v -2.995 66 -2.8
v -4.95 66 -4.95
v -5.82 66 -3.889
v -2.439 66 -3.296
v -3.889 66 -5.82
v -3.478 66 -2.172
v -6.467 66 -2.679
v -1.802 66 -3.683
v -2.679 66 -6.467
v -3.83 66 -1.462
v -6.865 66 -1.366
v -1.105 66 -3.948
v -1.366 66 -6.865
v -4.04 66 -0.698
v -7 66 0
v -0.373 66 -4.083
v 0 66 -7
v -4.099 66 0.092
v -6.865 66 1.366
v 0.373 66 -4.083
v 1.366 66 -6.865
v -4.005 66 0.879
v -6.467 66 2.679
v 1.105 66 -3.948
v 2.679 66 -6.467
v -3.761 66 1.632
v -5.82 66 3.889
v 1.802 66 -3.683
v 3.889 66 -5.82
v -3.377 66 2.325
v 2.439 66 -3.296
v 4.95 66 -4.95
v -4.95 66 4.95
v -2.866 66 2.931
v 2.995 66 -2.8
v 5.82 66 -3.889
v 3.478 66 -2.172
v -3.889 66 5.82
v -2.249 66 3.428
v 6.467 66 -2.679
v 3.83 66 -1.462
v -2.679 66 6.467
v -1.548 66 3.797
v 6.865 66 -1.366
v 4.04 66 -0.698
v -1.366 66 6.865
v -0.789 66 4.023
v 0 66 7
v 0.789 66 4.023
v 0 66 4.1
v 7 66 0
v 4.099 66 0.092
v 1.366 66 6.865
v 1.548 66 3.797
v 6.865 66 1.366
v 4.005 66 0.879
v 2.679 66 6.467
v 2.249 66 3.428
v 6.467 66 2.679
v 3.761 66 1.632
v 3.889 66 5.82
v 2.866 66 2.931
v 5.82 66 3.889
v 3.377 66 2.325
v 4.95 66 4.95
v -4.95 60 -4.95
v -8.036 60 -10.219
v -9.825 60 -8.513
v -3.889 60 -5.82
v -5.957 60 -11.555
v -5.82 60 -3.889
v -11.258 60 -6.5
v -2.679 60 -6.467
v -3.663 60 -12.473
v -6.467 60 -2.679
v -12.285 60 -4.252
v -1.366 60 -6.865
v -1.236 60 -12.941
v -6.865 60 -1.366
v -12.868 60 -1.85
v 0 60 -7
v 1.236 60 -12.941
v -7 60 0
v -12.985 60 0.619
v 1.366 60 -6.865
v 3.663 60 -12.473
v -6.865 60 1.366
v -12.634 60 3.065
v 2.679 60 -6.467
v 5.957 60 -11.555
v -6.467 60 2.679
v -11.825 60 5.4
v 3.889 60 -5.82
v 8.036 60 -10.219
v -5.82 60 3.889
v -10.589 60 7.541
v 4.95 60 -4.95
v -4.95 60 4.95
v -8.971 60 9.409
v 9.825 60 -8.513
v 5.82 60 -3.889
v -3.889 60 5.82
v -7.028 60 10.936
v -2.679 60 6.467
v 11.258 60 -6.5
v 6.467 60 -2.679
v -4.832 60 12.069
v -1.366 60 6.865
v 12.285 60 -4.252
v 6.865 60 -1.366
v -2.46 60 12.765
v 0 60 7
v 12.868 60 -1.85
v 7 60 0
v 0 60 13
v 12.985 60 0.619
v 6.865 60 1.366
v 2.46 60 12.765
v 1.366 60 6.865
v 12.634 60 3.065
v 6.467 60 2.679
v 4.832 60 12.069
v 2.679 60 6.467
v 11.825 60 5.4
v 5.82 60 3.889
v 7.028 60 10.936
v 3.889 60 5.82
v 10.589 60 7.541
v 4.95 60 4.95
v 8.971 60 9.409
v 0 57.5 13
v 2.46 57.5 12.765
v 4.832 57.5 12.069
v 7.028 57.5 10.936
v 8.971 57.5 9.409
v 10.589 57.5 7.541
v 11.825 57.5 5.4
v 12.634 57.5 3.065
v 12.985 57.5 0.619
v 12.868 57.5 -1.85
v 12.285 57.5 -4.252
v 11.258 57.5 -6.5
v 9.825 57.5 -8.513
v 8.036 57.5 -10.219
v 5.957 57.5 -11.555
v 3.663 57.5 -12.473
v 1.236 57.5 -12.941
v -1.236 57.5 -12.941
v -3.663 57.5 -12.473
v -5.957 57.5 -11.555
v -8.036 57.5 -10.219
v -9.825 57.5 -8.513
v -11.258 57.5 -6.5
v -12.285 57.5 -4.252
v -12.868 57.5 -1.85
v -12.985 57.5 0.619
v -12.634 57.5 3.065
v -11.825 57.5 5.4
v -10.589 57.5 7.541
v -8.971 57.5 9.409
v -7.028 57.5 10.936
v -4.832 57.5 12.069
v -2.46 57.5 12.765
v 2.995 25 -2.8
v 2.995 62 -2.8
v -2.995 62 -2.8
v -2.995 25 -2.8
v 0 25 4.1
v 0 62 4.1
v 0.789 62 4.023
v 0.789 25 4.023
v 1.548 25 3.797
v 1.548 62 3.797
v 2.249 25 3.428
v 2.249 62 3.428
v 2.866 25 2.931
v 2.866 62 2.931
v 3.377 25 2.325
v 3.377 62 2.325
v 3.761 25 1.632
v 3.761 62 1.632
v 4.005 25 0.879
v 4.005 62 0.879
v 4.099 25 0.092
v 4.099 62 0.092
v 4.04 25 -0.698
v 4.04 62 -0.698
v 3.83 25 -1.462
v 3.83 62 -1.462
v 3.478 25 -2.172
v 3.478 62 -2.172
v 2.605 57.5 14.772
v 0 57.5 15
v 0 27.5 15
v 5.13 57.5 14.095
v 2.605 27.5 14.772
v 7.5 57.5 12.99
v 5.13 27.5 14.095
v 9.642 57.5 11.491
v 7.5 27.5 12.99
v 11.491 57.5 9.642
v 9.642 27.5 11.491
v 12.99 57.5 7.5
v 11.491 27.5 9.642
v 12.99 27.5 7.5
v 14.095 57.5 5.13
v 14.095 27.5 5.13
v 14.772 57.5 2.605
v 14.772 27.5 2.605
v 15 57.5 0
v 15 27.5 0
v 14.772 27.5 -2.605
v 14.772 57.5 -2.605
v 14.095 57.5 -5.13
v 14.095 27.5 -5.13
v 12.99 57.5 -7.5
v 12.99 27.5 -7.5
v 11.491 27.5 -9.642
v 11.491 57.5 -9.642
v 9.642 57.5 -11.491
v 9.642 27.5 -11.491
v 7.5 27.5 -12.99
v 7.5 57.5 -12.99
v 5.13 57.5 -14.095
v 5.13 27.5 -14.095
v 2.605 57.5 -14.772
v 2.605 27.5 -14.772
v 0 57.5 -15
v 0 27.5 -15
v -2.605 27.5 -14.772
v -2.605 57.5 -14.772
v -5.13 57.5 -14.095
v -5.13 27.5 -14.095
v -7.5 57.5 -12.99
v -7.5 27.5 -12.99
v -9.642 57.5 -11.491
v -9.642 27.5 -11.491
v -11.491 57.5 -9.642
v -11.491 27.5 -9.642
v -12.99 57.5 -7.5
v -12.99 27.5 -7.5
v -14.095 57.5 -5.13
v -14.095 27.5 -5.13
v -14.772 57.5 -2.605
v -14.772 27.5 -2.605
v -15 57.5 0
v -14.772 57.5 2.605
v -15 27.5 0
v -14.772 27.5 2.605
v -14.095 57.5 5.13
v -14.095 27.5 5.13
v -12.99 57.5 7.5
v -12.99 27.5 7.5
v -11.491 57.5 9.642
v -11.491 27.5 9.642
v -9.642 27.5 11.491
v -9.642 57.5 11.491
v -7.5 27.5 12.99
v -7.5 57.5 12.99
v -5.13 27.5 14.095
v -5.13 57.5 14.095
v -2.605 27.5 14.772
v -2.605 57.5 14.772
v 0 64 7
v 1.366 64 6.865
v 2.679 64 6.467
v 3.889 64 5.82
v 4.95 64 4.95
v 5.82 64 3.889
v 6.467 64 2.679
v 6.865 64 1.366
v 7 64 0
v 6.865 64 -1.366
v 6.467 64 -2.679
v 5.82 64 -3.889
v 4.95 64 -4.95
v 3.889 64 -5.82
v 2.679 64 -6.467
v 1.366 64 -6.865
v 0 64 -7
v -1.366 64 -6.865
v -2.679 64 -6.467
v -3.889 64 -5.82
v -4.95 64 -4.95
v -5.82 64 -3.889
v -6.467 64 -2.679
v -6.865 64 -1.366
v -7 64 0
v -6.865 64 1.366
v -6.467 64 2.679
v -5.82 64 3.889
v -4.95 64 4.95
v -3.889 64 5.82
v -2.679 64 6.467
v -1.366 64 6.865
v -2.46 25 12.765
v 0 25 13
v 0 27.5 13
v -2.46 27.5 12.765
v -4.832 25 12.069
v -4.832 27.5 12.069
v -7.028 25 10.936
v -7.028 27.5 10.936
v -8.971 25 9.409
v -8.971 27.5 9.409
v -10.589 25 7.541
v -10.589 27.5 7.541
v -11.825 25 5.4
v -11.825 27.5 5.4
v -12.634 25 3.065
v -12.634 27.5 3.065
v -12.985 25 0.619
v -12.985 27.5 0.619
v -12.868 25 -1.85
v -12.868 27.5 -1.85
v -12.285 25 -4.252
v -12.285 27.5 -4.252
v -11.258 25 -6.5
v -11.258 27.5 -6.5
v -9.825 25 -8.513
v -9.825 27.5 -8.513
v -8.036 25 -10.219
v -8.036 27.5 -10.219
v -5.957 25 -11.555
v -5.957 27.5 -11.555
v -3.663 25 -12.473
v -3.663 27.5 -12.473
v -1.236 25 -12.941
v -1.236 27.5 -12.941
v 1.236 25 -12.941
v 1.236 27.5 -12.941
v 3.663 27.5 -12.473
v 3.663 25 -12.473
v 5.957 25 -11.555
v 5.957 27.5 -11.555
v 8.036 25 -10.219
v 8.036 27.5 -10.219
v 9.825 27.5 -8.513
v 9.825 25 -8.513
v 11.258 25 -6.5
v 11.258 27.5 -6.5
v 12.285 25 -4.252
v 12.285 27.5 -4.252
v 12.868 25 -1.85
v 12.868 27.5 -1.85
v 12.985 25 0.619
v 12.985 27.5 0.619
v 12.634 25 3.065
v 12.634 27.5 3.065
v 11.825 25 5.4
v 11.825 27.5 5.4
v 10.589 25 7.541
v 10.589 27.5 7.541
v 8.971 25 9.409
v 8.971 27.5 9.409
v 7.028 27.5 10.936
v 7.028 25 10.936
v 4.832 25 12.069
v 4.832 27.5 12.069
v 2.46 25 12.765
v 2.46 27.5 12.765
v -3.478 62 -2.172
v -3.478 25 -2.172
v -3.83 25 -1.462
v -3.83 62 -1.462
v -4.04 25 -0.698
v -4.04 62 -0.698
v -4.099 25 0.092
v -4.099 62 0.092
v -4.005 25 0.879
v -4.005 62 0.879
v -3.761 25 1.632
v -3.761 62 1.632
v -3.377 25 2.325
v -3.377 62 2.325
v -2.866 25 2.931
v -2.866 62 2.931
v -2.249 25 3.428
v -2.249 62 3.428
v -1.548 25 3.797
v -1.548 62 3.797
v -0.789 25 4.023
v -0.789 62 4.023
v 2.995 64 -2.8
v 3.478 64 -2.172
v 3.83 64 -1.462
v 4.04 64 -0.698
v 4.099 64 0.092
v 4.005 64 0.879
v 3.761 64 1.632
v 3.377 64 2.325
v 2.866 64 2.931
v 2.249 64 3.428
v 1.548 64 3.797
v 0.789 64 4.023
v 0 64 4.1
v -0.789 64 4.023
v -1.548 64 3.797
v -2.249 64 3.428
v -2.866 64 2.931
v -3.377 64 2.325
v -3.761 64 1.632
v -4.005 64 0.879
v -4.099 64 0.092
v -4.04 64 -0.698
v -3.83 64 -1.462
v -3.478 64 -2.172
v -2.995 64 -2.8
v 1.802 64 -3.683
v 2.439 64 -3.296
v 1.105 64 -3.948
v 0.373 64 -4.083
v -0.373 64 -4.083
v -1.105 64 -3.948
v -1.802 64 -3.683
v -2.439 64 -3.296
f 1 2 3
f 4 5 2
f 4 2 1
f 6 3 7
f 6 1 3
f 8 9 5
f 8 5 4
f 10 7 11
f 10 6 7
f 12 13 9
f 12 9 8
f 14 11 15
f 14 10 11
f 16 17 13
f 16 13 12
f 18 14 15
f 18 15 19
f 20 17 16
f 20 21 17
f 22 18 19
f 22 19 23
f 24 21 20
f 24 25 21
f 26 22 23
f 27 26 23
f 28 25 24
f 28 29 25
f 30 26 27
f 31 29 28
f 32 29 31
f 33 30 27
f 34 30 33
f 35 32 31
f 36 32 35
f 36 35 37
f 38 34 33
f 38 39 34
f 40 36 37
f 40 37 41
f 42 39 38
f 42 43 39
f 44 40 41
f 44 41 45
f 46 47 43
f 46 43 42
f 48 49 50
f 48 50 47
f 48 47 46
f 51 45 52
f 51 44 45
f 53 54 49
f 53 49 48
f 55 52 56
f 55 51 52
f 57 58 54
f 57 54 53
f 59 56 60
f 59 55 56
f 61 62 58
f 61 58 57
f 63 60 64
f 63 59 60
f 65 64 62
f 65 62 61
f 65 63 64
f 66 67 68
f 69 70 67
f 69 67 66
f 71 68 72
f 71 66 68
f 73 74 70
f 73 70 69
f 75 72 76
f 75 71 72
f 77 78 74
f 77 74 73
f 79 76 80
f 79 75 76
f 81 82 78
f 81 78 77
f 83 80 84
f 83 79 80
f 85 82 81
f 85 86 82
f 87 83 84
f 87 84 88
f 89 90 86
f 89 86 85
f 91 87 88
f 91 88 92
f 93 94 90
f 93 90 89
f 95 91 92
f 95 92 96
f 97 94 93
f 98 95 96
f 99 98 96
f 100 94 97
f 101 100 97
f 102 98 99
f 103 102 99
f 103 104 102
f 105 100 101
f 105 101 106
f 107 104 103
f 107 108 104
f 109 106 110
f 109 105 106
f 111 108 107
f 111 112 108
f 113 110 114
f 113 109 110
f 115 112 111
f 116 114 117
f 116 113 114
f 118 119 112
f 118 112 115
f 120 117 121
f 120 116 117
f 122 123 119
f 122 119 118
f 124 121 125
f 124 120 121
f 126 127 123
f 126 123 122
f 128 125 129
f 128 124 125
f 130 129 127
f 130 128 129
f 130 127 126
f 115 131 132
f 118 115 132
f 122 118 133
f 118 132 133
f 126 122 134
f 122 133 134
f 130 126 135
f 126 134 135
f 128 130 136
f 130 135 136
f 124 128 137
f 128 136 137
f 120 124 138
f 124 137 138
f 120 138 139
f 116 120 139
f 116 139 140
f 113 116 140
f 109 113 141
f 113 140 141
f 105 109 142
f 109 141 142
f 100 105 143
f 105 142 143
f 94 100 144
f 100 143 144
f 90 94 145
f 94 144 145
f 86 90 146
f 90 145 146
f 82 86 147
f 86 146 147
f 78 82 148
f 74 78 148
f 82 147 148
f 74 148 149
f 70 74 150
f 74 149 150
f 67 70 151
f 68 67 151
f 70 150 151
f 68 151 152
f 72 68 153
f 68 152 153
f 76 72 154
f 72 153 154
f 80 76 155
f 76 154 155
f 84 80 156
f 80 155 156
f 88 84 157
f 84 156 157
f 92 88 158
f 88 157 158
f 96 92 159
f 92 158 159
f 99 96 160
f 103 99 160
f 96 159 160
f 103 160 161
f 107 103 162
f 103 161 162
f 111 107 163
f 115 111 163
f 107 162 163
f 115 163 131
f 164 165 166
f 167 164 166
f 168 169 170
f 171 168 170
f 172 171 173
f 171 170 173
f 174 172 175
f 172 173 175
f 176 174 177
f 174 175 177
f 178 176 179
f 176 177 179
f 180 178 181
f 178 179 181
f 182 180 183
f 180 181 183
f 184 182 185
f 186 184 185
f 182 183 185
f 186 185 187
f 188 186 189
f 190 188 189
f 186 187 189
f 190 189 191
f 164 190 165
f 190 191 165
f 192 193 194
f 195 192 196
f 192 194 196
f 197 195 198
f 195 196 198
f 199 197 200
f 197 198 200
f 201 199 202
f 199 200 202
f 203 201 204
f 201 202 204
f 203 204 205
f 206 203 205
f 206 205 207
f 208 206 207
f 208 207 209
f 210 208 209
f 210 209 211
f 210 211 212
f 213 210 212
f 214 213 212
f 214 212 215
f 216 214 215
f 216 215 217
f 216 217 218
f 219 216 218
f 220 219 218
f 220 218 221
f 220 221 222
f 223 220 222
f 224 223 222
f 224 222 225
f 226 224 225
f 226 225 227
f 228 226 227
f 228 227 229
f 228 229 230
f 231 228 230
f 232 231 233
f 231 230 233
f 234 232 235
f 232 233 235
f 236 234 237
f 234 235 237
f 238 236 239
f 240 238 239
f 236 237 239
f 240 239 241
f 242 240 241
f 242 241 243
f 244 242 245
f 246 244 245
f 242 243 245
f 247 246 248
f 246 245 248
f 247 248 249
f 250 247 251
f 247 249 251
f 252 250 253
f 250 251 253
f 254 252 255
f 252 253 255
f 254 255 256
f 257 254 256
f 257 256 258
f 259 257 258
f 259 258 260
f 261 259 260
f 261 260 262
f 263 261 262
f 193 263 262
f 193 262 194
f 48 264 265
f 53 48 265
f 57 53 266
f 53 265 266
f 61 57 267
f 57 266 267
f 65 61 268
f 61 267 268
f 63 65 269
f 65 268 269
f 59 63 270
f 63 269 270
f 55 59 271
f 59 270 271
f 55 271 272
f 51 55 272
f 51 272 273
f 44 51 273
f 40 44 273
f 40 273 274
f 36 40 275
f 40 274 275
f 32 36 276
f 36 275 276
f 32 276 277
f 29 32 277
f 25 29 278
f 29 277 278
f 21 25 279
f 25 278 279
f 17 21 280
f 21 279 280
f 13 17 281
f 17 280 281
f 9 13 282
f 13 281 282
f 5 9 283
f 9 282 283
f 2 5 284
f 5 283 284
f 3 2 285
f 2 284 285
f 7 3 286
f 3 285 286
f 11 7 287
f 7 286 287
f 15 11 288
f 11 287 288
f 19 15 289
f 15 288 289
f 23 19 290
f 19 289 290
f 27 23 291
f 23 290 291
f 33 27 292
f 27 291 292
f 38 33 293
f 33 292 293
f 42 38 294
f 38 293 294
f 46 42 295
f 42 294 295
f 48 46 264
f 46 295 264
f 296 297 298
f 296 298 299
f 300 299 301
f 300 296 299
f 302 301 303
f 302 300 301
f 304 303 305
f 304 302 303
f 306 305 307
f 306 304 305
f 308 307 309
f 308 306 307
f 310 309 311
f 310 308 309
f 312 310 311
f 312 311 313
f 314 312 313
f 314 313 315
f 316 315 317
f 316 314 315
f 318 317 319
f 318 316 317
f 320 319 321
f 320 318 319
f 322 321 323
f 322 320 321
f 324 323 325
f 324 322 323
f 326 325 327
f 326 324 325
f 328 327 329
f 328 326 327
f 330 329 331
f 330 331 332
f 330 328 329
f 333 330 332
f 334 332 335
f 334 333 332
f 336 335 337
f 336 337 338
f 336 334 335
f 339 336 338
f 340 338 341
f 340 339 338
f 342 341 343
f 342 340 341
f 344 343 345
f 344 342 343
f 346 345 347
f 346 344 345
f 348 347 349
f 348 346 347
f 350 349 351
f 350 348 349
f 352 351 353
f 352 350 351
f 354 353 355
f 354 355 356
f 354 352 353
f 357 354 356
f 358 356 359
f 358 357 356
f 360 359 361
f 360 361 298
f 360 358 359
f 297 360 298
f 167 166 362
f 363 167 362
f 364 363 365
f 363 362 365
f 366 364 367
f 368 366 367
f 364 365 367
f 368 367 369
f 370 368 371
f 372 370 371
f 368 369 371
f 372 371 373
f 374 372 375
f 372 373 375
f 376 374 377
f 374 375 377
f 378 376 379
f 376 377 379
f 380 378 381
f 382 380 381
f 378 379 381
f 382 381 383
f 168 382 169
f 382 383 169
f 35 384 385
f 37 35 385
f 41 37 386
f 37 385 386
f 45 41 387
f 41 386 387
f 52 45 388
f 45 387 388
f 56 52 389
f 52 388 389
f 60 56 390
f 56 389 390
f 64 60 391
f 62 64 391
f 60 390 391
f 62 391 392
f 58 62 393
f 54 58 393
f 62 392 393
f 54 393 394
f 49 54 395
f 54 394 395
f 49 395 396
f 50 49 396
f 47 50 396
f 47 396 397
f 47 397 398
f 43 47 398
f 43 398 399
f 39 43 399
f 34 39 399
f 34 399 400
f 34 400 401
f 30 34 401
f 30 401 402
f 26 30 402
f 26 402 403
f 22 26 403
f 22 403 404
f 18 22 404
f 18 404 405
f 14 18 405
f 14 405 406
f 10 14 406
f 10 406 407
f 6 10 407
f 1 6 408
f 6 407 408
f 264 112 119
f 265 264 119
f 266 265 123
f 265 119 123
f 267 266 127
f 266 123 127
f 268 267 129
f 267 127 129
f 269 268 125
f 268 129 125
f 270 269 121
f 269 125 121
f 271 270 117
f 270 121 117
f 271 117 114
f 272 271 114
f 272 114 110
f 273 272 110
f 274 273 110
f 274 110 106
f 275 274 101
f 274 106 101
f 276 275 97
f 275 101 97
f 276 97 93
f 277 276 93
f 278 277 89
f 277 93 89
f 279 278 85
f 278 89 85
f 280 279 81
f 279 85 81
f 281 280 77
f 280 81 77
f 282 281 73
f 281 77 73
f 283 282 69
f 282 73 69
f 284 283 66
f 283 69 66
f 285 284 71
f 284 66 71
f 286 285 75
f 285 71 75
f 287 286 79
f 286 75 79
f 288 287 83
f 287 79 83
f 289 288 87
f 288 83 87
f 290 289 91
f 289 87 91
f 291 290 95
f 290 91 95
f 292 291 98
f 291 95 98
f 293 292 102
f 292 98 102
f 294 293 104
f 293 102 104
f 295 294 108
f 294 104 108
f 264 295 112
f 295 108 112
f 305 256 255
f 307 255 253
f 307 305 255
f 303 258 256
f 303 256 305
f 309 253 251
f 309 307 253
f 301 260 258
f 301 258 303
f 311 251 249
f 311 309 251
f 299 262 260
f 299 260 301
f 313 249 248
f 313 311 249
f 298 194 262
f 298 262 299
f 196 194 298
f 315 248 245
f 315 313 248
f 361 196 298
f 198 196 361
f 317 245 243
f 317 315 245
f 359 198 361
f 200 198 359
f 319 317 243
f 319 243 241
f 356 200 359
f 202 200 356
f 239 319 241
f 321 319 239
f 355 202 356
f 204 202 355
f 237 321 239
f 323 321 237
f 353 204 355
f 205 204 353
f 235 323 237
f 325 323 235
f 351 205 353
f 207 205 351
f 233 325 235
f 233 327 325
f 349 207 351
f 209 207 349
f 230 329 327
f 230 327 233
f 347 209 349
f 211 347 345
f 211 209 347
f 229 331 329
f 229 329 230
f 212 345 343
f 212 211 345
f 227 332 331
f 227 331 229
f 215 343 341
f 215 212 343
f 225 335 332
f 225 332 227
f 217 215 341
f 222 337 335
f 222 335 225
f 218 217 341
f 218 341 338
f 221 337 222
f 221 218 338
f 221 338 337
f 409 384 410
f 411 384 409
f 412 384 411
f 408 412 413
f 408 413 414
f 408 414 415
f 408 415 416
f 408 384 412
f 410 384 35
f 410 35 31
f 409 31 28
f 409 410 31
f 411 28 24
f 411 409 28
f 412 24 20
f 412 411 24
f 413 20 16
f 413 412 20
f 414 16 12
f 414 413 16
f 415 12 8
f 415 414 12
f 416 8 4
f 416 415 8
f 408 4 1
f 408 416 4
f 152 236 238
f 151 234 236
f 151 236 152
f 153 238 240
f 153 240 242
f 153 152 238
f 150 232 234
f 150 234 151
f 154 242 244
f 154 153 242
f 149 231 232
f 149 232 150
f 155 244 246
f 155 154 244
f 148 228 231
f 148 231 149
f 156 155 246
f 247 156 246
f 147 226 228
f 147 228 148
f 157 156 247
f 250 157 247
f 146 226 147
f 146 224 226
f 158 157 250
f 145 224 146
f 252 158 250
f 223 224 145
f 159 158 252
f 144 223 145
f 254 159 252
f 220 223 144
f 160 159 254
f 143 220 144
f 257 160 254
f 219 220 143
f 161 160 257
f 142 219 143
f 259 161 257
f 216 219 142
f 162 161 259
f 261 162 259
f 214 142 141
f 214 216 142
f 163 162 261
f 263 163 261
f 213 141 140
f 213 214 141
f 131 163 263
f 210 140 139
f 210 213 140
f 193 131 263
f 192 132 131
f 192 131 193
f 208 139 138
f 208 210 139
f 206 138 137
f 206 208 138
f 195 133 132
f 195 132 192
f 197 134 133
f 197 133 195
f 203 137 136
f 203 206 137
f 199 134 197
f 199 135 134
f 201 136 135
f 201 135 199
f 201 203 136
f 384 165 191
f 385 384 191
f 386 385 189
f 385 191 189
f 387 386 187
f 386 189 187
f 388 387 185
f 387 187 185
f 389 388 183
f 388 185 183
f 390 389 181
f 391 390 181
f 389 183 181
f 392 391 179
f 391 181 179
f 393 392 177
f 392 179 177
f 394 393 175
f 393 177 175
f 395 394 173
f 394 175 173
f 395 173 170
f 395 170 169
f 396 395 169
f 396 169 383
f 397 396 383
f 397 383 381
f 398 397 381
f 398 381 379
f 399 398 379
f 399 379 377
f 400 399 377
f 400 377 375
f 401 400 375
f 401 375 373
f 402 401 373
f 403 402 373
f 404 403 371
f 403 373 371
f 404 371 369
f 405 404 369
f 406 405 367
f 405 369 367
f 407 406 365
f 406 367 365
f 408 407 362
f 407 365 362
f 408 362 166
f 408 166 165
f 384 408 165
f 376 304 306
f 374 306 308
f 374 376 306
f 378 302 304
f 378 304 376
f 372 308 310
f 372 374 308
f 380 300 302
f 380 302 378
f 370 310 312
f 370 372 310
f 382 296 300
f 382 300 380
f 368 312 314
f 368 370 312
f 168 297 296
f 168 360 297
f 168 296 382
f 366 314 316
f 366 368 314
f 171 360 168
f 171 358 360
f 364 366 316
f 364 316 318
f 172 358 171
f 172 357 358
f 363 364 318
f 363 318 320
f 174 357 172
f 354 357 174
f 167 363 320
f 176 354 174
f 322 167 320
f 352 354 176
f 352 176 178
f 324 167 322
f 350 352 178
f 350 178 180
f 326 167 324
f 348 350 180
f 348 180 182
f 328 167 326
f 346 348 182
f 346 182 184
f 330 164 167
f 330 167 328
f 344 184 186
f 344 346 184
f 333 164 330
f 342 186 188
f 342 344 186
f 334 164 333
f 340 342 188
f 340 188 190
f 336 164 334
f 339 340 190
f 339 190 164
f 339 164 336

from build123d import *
from build123d.topology import SkipClean

# Parameters (mm, degrees)
SKETCH1_R           = 15
BOSS_EXTRUDE1_DEPTH = 60
CUT_EXTRUDE1_START  = -2.5
SKETCH2_R           = 15
SKETCH2_R_2         = 13
CUT_EXTRUDE1_DEPTH  = 2.5
SKETCH3_R           = 15
CUT_EXTRUDE2_DEPTH  = 25
SKETCH4_R           = 15
SKETCH4_R_2         = 13
CUT_EXTRUDE3_DEPTH  = 2.5
SKETCH6_R           = 2.870458913
BOSS_EXTRUDE2_DEPTH = 9.5
SKETCH7_R           = 7
BOSS_EXTRUDE3_DEPTH = 2
SKETCH8_R           = 19
CUT_EXTRUDE4_DEPTH  = 43.649736224
CUT_EXTRUDE5_DEPTH  = 43.649736224
SKETCH10_R          = 7
BOSS_EXTRUDE4_DEPTH = 2
CUT_EXTRUDE6_DEPTH  = 45.395945761
SKETCH12_R          = 7
BOSS_EXTRUDE5_DEPTH = 2
CUT_EXTRUDE7_DEPTH  = 47.16275555
CUT_EXTRUDE8_START  = -2
SKETCH14_R          = 4.1
CUT_EXTRUDE8_DEPTH  = 2


with BuildPart() as part:
    # Sketch1 → Boss-Extrude1 (new body)
    with BuildSketch(Plane(origin=(0, 0, 0), x_dir=(1, 0, 0), z_dir=(0, 1, 0))):
        with Locations(Location((0, 0, 0), (0, 0, 270))):
            Circle(SKETCH1_R)
    extrude(amount=BOSS_EXTRUDE1_DEPTH)

    # Sketch2 → Cut-Extrude1 (cut)
    with BuildSketch(Plane(origin=(0, 60, 0), x_dir=(1, 0, 0), z_dir=(0, 1, 0)).offset(CUT_EXTRUDE1_START)):
        with Locations(Location((0, 0, 0), (0, 0, 270))):
            Circle(SKETCH2_R)
        with Locations(Location((0, 0, 0), (0, 0, 270))):
            Circle(SKETCH2_R_2, mode=Mode.SUBTRACT)
    extrude(amount=CUT_EXTRUDE1_DEPTH, mode=Mode.SUBTRACT)

    # Sketch3 → Cut-Extrude2 (cut)
    with BuildSketch(Plane.XZ):
        with Locations(Location((0, 0, 0), (0, 0, 270))):
            Circle(SKETCH3_R)
    extrude(amount=-CUT_EXTRUDE2_DEPTH, mode=Mode.SUBTRACT)

    # Sketch4 → Cut-Extrude3 (cut)
    with BuildSketch(Plane.XZ.offset(-25)):
        with Locations(Location((0, 0, 0), (0, 0, 270))):
            Circle(SKETCH4_R)
        with Locations(Location((0, 0, 0), (0, 0, 90))):
            Circle(SKETCH4_R_2, mode=Mode.SUBTRACT)
    extrude(amount=-CUT_EXTRUDE3_DEPTH, mode=Mode.SUBTRACT)

    # Sketch6 → Boss-Extrude2 (add)
    with BuildSketch(Plane.XZ.offset(-25)):
        with Locations(Location((0, 0, 0), (0, 0, 270))):
            Circle(SKETCH6_R)
    extrude(amount=BOSS_EXTRUDE2_DEPTH)

    # Sketch7 → Boss-Extrude3 (add)
    with BuildSketch(Plane(origin=(0, 60, 0), x_dir=(1, 0, 0), z_dir=(0, 1, 0))):
        with Locations(Location((0, 0, 0), (0, 0, 270))):
            Circle(SKETCH7_R)
    extrude(amount=BOSS_EXTRUDE3_DEPTH)

    # Sketch8 → Cut-Extrude4 (cut, through all)
    with BuildSketch(Plane.XZ.offset(-25)):
        Circle(SKETCH8_R)
    extrude(amount=CUT_EXTRUDE4_DEPTH, mode=Mode.SUBTRACT)

    # Sketch9 → Cut-Extrude5 (cut, through all)
    with BuildSketch(Plane(origin=(0, 62, 0), x_dir=(1, 0, 0), z_dir=(0, 1, 0))):
        with BuildLine():
            ThreePointArc((-2.994995826, 2.8), (-3.760983914, -1.632482772), (0, -4.1))
            Line((0, -4.1), (0, 2.8))
            Line((0, 2.8), (-2.994995826, 2.8))
        make_face()
        with BuildLine():
            Line((0, 2.8), (0, -4.1))
            ThreePointArc((0, -4.1), (3.760983914, -1.632482772), (2.994995826, 2.8))
            Line((2.994995826, 2.8), (0, 2.8))
        make_face()
    extrude(amount=-CUT_EXTRUDE5_DEPTH, mode=Mode.SUBTRACT)

    # Sketch10 → Boss-Extrude4 (add)
    with BuildSketch(Plane(origin=(0, 62, 0), x_dir=(1, 0, 0), z_dir=(0, 1, 0))):
        with Locations(Location((0, 0, 0), (0, 0, 270))):
            Circle(SKETCH10_R)
    extrude(amount=BOSS_EXTRUDE4_DEPTH)

    # Sketch11 → Cut-Extrude6 (cut, through all)
    with SkipClean():  # the faces are left unmerged after this step: merging them gives an invalid solid
        with BuildSketch(Plane.XZ.offset(-25)):
            with BuildLine():
                Line((-2.994995826, -2.8), (2.994995826, -2.8))
                ThreePointArc((2.994995826, -2.8), (0, 4.1), (-2.994995826, -2.8))
            make_face()
        extrude(amount=-CUT_EXTRUDE6_DEPTH, mode=Mode.SUBTRACT)

    # Sketch12 → Boss-Extrude5 (add)
    with SkipClean():  # the faces are left unmerged after this step: merging them gives an invalid solid
        with BuildSketch(Plane(origin=(0, 64, 0), x_dir=(1, 0, 0), z_dir=(0, 1, 0))):
            with Locations(Location((0, 0, 0), (0, 0, 270))):
                Circle(SKETCH12_R)
        extrude(amount=BOSS_EXTRUDE5_DEPTH)

    # Sketch13 → Cut-Extrude7 (cut, through all)
    with SkipClean():  # the faces are left unmerged after this step: merging them gives an invalid solid
        with BuildSketch(Plane.XZ.offset(-25)):
            with BuildLine():
                Line((-2.994995826, -2.8), (2.994995826, -2.8))
                ThreePointArc((2.994995826, -2.8), (0, 4.1), (-2.994995826, -2.8))
            make_face()
        extrude(amount=-CUT_EXTRUDE7_DEPTH, mode=Mode.SUBTRACT)

    # Sketch14 → Cut-Extrude8 (cut)
    with SkipClean():  # the faces are left unmerged after this step: merging them gives an invalid solid
        with BuildSketch(Plane(origin=(0, 66, 0), x_dir=(1, 0, 0), z_dir=(0, 1, 0)).offset(CUT_EXTRUDE8_START)):
            with Locations(Location((0, 0, 0), (0, 0, 136.927218653))):
                Circle(SKETCH14_R)
        extrude(amount=CUT_EXTRUDE8_DEPTH, mode=Mode.SUBTRACT)


solid = part.part
